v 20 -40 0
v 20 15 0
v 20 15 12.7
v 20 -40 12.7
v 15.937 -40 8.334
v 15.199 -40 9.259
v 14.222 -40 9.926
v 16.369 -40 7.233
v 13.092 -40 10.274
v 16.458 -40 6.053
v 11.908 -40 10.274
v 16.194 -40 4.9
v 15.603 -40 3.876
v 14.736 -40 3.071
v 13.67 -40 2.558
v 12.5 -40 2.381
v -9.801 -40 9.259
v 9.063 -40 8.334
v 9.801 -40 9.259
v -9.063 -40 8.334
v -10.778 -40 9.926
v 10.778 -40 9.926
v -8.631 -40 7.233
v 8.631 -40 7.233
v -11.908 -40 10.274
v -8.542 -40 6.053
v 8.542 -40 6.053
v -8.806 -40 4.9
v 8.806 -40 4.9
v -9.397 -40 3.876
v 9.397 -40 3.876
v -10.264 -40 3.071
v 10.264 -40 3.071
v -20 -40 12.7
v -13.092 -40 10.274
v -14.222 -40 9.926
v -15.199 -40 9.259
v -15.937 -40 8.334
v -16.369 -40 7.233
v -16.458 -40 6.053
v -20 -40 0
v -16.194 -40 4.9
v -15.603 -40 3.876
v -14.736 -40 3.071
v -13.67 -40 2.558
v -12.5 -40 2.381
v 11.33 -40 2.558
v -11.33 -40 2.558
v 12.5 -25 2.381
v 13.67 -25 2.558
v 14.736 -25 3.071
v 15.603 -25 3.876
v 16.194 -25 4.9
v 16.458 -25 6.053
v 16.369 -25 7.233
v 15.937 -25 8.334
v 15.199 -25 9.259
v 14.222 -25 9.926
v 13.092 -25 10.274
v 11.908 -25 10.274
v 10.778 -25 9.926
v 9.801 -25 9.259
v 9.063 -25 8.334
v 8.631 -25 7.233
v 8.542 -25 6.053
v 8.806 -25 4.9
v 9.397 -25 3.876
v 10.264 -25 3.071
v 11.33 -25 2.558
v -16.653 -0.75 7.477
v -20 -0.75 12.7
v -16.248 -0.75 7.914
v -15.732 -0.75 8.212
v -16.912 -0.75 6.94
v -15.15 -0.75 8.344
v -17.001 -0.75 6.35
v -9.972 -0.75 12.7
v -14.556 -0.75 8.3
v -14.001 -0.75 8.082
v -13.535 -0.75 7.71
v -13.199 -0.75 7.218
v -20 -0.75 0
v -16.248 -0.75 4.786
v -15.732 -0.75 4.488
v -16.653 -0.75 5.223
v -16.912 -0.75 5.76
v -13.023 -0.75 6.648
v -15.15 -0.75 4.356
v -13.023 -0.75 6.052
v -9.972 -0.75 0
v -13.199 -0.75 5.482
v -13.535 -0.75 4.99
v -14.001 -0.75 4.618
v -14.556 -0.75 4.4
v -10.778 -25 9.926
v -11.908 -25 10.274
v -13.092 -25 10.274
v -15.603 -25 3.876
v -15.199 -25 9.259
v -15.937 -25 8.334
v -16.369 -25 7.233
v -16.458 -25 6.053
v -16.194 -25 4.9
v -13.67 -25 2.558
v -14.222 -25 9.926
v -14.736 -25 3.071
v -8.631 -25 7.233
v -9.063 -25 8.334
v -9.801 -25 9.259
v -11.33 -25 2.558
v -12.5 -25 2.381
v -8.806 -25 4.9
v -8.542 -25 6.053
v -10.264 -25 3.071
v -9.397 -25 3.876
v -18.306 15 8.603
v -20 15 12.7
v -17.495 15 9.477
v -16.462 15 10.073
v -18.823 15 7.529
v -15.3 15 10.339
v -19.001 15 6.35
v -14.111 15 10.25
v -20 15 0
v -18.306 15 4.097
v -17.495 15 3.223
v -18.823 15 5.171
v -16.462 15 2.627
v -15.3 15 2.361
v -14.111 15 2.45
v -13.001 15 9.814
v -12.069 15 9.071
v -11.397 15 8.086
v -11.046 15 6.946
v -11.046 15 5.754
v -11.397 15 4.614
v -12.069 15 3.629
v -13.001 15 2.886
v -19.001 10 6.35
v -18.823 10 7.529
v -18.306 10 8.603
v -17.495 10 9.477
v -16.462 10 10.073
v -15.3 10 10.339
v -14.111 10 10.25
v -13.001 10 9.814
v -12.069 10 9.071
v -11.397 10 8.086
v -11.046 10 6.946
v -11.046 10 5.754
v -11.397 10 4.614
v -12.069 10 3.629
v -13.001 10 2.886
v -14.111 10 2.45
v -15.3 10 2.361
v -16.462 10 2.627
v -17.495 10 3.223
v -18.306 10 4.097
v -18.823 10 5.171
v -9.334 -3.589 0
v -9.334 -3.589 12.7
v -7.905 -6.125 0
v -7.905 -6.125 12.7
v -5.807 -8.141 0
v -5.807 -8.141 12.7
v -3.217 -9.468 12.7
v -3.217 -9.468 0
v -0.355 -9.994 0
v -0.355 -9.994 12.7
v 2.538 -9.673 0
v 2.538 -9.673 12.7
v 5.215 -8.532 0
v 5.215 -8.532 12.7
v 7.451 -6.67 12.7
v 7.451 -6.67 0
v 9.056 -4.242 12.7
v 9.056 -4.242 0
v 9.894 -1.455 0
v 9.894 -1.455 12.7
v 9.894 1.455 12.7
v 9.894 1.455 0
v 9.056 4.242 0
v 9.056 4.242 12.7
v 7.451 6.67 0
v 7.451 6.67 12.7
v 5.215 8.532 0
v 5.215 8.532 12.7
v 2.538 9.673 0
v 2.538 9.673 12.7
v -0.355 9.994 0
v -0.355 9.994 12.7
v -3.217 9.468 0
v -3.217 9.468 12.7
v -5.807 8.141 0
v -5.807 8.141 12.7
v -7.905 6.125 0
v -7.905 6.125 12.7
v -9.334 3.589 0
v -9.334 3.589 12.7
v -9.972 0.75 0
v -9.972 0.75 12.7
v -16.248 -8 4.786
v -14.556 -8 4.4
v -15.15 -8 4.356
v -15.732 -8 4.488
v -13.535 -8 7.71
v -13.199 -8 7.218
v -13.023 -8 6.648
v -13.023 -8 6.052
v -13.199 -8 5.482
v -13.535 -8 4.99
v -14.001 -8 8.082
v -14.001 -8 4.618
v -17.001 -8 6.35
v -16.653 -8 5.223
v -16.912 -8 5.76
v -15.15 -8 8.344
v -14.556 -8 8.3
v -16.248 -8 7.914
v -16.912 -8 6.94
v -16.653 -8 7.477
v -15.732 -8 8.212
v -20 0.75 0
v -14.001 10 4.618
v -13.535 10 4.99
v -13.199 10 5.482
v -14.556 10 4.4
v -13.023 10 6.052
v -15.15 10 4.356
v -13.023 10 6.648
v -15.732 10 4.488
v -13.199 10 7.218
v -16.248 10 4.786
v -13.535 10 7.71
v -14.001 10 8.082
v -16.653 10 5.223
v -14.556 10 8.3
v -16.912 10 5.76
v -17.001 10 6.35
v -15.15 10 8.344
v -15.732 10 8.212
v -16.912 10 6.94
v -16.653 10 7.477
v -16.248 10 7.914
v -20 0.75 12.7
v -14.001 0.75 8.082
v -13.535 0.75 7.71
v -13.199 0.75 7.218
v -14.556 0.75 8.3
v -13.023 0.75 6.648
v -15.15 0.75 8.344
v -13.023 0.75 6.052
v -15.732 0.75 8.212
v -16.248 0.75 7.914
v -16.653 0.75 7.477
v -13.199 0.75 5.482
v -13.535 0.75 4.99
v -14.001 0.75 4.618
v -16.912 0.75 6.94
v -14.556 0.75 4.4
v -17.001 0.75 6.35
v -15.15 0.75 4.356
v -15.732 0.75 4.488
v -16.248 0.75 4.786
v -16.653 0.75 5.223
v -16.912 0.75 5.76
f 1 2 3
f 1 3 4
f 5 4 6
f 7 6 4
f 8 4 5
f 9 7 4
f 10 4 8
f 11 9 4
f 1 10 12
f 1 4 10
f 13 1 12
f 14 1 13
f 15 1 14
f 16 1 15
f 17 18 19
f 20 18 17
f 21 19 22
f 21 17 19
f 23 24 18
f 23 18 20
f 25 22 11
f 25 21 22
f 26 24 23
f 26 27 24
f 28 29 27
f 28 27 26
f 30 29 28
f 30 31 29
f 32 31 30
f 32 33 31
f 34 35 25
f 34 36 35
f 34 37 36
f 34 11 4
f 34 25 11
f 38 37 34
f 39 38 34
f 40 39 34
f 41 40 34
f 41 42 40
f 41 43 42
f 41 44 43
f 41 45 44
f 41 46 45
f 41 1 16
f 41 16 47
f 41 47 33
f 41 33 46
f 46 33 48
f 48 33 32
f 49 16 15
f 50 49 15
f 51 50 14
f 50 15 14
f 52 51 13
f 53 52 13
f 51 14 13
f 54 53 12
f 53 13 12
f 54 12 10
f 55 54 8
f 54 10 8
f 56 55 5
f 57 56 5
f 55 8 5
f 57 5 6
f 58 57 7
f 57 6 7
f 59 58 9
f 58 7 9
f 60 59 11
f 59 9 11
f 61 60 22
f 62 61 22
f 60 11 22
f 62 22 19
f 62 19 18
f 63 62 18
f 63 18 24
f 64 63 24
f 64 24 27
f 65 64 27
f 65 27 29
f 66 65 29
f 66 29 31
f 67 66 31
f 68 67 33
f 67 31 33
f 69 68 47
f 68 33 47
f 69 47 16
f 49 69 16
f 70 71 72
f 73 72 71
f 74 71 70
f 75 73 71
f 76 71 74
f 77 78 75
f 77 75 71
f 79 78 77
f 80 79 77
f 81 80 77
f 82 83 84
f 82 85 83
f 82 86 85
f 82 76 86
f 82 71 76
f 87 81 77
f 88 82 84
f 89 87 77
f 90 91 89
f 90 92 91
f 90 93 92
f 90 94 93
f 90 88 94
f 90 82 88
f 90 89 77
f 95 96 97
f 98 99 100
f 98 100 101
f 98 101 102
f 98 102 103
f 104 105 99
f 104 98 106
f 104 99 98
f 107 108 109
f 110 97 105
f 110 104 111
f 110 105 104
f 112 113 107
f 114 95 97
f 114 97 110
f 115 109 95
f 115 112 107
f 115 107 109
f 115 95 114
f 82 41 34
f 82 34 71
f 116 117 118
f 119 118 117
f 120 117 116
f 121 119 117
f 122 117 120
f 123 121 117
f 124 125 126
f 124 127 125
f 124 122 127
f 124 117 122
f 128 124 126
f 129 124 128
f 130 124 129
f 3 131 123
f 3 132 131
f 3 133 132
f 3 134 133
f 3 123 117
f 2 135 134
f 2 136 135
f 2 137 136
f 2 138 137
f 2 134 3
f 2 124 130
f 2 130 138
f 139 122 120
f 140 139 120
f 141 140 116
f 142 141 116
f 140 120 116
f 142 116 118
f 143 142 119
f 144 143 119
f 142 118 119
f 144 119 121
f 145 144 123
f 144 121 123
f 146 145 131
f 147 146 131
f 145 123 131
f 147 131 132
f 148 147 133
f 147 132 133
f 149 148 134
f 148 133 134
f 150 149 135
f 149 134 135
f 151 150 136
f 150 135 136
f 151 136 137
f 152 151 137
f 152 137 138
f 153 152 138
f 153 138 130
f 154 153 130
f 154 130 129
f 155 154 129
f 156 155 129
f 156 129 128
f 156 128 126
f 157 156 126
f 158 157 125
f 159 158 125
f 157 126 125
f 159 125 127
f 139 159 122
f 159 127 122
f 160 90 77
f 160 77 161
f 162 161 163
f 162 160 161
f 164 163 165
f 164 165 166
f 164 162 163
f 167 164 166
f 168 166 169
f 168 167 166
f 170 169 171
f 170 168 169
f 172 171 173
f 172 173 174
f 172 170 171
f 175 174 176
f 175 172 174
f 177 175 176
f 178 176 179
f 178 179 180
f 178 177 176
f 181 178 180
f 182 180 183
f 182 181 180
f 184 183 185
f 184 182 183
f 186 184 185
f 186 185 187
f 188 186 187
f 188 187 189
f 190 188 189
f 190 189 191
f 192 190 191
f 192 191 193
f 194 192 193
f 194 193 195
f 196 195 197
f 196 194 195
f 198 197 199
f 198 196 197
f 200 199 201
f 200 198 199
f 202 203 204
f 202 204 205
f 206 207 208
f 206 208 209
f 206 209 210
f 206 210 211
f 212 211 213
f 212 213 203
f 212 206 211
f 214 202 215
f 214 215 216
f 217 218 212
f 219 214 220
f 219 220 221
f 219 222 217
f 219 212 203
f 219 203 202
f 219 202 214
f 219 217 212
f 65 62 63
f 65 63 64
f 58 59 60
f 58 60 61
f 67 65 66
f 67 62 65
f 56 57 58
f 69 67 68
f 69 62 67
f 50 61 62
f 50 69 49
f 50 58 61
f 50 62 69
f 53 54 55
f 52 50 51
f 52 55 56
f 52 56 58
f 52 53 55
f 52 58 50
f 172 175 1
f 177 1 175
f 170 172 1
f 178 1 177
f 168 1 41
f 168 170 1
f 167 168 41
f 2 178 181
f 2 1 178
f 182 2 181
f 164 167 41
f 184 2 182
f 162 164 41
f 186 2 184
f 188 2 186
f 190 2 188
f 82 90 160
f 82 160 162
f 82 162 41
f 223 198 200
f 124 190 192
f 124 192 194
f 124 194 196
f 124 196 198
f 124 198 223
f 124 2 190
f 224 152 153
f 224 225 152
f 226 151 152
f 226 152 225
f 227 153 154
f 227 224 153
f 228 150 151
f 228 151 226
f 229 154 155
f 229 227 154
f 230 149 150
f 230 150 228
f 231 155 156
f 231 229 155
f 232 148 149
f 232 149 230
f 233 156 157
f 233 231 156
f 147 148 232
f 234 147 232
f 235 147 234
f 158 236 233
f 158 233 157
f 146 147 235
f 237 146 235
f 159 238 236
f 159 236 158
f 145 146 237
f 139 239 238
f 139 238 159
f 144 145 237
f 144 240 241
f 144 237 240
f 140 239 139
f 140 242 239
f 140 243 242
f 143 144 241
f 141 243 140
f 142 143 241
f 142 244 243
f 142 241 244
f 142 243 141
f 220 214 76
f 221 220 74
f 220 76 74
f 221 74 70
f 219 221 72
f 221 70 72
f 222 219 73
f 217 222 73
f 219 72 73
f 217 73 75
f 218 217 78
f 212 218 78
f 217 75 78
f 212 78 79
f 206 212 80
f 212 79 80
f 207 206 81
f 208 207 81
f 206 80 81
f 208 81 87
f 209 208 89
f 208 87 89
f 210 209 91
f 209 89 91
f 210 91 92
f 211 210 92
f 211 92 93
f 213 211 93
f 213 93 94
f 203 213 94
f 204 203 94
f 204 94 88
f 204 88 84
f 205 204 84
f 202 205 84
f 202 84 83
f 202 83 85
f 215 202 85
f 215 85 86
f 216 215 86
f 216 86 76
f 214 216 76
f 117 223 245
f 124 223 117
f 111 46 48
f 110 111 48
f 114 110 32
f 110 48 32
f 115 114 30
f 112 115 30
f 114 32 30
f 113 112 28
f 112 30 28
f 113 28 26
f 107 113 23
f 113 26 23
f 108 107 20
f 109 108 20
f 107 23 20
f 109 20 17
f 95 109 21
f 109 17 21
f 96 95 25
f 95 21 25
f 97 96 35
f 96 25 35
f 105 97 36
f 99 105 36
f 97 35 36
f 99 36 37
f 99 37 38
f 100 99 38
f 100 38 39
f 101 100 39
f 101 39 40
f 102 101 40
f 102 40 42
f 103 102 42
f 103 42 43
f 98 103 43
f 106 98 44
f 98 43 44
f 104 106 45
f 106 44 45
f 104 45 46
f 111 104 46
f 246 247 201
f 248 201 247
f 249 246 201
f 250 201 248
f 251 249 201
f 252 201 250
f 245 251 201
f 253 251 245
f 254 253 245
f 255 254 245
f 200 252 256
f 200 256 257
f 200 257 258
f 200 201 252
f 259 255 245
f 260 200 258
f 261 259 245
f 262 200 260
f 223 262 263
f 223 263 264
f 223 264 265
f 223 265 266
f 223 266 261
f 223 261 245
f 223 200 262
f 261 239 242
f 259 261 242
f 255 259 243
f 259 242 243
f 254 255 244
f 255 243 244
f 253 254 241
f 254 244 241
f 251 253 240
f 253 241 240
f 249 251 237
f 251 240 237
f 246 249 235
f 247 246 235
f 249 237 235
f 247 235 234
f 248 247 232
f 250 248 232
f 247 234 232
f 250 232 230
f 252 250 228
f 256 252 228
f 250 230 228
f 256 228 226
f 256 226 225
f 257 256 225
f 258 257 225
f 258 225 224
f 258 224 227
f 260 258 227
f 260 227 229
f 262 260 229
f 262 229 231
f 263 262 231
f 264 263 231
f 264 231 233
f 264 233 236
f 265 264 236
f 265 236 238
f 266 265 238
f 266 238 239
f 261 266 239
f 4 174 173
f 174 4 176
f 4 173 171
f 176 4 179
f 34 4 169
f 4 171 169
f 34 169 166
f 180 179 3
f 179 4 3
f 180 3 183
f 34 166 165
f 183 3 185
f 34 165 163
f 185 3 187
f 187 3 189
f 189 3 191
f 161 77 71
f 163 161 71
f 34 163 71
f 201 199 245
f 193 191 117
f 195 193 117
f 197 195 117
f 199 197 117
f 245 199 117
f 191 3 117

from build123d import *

# Parameters (mm, degrees)
SALIENTE_EXTRUIR1_DEPTH = 12.7
CROQUIS2_R              = 2
CORTAR_EXTRUIR1_DEPTH   = 23
CROQUIS3_R              = 4
CORTAR_EXTRUIR2_DEPTH   = 5
CROQUIS4_R              = 3.96875
CORTAR_EXTRUIR3_DEPTH   = 15


with BuildPart() as part:
    # Croquis1 → Saliente-Extruir1 (new body)
    with BuildSketch(Plane.XY):
        with BuildLine():
            ThreePointArc((-9.971835338, -0.75), (10, 0), (-9.971835338, 0.75))
            Line((-9.971835338, 0.75), (-20, 0.75))
            Line((-20, 0.75), (-20, 15))
            Line((-20, 15), (20, 15))
            Line((20, 15), (20, -40))
            Line((20, -40), (-20, -40))
            Line((-20, -40), (-20, -0.75))
            Line((-20, -0.75), (-9.971835338, -0.75))
        make_face()
    extrude(amount=SALIENTE_EXTRUIR1_DEPTH)

    # Croquis2 → Cortar-Extruir1 (cut)
    with BuildSketch(Plane(origin=(0, 15, 0), x_dir=(1, 0, 0), z_dir=(0, 1, 0))):
        with Locations(Location((-15.000994664, -6.35, 0), (0, 0, 180))):
            Circle(CROQUIS2_R)
    extrude(amount=-CORTAR_EXTRUIR1_DEPTH, mode=Mode.SUBTRACT)

    # Croquis3 → Cortar-Extruir2 (cut)
    with BuildSketch(Plane(origin=(0, 15, 0), x_dir=(1, 0, 0), z_dir=(0, 1, 0))):
        with Locations(Location((-15.000994664, -6.35, 0), (0, 0, 180))):
            Circle(CROQUIS3_R)
    extrude(amount=-CORTAR_EXTRUIR2_DEPTH, mode=Mode.SUBTRACT)

    # Croquis4 → Cortar-Extruir3 (cut)
    with BuildSketch(Plane.XZ.offset(40)):
        with Locations(Location((-12.5, 6.35, 0), (0, 0, 270))):
            Circle(CROQUIS4_R)
        with Locations(Location((12.5, 6.35, 0), (0, 0, 270))):
            Circle(CROQUIS4_R)
    extrude(amount=-CORTAR_EXTRUIR3_DEPTH, mode=Mode.SUBTRACT)


solid = part.part
